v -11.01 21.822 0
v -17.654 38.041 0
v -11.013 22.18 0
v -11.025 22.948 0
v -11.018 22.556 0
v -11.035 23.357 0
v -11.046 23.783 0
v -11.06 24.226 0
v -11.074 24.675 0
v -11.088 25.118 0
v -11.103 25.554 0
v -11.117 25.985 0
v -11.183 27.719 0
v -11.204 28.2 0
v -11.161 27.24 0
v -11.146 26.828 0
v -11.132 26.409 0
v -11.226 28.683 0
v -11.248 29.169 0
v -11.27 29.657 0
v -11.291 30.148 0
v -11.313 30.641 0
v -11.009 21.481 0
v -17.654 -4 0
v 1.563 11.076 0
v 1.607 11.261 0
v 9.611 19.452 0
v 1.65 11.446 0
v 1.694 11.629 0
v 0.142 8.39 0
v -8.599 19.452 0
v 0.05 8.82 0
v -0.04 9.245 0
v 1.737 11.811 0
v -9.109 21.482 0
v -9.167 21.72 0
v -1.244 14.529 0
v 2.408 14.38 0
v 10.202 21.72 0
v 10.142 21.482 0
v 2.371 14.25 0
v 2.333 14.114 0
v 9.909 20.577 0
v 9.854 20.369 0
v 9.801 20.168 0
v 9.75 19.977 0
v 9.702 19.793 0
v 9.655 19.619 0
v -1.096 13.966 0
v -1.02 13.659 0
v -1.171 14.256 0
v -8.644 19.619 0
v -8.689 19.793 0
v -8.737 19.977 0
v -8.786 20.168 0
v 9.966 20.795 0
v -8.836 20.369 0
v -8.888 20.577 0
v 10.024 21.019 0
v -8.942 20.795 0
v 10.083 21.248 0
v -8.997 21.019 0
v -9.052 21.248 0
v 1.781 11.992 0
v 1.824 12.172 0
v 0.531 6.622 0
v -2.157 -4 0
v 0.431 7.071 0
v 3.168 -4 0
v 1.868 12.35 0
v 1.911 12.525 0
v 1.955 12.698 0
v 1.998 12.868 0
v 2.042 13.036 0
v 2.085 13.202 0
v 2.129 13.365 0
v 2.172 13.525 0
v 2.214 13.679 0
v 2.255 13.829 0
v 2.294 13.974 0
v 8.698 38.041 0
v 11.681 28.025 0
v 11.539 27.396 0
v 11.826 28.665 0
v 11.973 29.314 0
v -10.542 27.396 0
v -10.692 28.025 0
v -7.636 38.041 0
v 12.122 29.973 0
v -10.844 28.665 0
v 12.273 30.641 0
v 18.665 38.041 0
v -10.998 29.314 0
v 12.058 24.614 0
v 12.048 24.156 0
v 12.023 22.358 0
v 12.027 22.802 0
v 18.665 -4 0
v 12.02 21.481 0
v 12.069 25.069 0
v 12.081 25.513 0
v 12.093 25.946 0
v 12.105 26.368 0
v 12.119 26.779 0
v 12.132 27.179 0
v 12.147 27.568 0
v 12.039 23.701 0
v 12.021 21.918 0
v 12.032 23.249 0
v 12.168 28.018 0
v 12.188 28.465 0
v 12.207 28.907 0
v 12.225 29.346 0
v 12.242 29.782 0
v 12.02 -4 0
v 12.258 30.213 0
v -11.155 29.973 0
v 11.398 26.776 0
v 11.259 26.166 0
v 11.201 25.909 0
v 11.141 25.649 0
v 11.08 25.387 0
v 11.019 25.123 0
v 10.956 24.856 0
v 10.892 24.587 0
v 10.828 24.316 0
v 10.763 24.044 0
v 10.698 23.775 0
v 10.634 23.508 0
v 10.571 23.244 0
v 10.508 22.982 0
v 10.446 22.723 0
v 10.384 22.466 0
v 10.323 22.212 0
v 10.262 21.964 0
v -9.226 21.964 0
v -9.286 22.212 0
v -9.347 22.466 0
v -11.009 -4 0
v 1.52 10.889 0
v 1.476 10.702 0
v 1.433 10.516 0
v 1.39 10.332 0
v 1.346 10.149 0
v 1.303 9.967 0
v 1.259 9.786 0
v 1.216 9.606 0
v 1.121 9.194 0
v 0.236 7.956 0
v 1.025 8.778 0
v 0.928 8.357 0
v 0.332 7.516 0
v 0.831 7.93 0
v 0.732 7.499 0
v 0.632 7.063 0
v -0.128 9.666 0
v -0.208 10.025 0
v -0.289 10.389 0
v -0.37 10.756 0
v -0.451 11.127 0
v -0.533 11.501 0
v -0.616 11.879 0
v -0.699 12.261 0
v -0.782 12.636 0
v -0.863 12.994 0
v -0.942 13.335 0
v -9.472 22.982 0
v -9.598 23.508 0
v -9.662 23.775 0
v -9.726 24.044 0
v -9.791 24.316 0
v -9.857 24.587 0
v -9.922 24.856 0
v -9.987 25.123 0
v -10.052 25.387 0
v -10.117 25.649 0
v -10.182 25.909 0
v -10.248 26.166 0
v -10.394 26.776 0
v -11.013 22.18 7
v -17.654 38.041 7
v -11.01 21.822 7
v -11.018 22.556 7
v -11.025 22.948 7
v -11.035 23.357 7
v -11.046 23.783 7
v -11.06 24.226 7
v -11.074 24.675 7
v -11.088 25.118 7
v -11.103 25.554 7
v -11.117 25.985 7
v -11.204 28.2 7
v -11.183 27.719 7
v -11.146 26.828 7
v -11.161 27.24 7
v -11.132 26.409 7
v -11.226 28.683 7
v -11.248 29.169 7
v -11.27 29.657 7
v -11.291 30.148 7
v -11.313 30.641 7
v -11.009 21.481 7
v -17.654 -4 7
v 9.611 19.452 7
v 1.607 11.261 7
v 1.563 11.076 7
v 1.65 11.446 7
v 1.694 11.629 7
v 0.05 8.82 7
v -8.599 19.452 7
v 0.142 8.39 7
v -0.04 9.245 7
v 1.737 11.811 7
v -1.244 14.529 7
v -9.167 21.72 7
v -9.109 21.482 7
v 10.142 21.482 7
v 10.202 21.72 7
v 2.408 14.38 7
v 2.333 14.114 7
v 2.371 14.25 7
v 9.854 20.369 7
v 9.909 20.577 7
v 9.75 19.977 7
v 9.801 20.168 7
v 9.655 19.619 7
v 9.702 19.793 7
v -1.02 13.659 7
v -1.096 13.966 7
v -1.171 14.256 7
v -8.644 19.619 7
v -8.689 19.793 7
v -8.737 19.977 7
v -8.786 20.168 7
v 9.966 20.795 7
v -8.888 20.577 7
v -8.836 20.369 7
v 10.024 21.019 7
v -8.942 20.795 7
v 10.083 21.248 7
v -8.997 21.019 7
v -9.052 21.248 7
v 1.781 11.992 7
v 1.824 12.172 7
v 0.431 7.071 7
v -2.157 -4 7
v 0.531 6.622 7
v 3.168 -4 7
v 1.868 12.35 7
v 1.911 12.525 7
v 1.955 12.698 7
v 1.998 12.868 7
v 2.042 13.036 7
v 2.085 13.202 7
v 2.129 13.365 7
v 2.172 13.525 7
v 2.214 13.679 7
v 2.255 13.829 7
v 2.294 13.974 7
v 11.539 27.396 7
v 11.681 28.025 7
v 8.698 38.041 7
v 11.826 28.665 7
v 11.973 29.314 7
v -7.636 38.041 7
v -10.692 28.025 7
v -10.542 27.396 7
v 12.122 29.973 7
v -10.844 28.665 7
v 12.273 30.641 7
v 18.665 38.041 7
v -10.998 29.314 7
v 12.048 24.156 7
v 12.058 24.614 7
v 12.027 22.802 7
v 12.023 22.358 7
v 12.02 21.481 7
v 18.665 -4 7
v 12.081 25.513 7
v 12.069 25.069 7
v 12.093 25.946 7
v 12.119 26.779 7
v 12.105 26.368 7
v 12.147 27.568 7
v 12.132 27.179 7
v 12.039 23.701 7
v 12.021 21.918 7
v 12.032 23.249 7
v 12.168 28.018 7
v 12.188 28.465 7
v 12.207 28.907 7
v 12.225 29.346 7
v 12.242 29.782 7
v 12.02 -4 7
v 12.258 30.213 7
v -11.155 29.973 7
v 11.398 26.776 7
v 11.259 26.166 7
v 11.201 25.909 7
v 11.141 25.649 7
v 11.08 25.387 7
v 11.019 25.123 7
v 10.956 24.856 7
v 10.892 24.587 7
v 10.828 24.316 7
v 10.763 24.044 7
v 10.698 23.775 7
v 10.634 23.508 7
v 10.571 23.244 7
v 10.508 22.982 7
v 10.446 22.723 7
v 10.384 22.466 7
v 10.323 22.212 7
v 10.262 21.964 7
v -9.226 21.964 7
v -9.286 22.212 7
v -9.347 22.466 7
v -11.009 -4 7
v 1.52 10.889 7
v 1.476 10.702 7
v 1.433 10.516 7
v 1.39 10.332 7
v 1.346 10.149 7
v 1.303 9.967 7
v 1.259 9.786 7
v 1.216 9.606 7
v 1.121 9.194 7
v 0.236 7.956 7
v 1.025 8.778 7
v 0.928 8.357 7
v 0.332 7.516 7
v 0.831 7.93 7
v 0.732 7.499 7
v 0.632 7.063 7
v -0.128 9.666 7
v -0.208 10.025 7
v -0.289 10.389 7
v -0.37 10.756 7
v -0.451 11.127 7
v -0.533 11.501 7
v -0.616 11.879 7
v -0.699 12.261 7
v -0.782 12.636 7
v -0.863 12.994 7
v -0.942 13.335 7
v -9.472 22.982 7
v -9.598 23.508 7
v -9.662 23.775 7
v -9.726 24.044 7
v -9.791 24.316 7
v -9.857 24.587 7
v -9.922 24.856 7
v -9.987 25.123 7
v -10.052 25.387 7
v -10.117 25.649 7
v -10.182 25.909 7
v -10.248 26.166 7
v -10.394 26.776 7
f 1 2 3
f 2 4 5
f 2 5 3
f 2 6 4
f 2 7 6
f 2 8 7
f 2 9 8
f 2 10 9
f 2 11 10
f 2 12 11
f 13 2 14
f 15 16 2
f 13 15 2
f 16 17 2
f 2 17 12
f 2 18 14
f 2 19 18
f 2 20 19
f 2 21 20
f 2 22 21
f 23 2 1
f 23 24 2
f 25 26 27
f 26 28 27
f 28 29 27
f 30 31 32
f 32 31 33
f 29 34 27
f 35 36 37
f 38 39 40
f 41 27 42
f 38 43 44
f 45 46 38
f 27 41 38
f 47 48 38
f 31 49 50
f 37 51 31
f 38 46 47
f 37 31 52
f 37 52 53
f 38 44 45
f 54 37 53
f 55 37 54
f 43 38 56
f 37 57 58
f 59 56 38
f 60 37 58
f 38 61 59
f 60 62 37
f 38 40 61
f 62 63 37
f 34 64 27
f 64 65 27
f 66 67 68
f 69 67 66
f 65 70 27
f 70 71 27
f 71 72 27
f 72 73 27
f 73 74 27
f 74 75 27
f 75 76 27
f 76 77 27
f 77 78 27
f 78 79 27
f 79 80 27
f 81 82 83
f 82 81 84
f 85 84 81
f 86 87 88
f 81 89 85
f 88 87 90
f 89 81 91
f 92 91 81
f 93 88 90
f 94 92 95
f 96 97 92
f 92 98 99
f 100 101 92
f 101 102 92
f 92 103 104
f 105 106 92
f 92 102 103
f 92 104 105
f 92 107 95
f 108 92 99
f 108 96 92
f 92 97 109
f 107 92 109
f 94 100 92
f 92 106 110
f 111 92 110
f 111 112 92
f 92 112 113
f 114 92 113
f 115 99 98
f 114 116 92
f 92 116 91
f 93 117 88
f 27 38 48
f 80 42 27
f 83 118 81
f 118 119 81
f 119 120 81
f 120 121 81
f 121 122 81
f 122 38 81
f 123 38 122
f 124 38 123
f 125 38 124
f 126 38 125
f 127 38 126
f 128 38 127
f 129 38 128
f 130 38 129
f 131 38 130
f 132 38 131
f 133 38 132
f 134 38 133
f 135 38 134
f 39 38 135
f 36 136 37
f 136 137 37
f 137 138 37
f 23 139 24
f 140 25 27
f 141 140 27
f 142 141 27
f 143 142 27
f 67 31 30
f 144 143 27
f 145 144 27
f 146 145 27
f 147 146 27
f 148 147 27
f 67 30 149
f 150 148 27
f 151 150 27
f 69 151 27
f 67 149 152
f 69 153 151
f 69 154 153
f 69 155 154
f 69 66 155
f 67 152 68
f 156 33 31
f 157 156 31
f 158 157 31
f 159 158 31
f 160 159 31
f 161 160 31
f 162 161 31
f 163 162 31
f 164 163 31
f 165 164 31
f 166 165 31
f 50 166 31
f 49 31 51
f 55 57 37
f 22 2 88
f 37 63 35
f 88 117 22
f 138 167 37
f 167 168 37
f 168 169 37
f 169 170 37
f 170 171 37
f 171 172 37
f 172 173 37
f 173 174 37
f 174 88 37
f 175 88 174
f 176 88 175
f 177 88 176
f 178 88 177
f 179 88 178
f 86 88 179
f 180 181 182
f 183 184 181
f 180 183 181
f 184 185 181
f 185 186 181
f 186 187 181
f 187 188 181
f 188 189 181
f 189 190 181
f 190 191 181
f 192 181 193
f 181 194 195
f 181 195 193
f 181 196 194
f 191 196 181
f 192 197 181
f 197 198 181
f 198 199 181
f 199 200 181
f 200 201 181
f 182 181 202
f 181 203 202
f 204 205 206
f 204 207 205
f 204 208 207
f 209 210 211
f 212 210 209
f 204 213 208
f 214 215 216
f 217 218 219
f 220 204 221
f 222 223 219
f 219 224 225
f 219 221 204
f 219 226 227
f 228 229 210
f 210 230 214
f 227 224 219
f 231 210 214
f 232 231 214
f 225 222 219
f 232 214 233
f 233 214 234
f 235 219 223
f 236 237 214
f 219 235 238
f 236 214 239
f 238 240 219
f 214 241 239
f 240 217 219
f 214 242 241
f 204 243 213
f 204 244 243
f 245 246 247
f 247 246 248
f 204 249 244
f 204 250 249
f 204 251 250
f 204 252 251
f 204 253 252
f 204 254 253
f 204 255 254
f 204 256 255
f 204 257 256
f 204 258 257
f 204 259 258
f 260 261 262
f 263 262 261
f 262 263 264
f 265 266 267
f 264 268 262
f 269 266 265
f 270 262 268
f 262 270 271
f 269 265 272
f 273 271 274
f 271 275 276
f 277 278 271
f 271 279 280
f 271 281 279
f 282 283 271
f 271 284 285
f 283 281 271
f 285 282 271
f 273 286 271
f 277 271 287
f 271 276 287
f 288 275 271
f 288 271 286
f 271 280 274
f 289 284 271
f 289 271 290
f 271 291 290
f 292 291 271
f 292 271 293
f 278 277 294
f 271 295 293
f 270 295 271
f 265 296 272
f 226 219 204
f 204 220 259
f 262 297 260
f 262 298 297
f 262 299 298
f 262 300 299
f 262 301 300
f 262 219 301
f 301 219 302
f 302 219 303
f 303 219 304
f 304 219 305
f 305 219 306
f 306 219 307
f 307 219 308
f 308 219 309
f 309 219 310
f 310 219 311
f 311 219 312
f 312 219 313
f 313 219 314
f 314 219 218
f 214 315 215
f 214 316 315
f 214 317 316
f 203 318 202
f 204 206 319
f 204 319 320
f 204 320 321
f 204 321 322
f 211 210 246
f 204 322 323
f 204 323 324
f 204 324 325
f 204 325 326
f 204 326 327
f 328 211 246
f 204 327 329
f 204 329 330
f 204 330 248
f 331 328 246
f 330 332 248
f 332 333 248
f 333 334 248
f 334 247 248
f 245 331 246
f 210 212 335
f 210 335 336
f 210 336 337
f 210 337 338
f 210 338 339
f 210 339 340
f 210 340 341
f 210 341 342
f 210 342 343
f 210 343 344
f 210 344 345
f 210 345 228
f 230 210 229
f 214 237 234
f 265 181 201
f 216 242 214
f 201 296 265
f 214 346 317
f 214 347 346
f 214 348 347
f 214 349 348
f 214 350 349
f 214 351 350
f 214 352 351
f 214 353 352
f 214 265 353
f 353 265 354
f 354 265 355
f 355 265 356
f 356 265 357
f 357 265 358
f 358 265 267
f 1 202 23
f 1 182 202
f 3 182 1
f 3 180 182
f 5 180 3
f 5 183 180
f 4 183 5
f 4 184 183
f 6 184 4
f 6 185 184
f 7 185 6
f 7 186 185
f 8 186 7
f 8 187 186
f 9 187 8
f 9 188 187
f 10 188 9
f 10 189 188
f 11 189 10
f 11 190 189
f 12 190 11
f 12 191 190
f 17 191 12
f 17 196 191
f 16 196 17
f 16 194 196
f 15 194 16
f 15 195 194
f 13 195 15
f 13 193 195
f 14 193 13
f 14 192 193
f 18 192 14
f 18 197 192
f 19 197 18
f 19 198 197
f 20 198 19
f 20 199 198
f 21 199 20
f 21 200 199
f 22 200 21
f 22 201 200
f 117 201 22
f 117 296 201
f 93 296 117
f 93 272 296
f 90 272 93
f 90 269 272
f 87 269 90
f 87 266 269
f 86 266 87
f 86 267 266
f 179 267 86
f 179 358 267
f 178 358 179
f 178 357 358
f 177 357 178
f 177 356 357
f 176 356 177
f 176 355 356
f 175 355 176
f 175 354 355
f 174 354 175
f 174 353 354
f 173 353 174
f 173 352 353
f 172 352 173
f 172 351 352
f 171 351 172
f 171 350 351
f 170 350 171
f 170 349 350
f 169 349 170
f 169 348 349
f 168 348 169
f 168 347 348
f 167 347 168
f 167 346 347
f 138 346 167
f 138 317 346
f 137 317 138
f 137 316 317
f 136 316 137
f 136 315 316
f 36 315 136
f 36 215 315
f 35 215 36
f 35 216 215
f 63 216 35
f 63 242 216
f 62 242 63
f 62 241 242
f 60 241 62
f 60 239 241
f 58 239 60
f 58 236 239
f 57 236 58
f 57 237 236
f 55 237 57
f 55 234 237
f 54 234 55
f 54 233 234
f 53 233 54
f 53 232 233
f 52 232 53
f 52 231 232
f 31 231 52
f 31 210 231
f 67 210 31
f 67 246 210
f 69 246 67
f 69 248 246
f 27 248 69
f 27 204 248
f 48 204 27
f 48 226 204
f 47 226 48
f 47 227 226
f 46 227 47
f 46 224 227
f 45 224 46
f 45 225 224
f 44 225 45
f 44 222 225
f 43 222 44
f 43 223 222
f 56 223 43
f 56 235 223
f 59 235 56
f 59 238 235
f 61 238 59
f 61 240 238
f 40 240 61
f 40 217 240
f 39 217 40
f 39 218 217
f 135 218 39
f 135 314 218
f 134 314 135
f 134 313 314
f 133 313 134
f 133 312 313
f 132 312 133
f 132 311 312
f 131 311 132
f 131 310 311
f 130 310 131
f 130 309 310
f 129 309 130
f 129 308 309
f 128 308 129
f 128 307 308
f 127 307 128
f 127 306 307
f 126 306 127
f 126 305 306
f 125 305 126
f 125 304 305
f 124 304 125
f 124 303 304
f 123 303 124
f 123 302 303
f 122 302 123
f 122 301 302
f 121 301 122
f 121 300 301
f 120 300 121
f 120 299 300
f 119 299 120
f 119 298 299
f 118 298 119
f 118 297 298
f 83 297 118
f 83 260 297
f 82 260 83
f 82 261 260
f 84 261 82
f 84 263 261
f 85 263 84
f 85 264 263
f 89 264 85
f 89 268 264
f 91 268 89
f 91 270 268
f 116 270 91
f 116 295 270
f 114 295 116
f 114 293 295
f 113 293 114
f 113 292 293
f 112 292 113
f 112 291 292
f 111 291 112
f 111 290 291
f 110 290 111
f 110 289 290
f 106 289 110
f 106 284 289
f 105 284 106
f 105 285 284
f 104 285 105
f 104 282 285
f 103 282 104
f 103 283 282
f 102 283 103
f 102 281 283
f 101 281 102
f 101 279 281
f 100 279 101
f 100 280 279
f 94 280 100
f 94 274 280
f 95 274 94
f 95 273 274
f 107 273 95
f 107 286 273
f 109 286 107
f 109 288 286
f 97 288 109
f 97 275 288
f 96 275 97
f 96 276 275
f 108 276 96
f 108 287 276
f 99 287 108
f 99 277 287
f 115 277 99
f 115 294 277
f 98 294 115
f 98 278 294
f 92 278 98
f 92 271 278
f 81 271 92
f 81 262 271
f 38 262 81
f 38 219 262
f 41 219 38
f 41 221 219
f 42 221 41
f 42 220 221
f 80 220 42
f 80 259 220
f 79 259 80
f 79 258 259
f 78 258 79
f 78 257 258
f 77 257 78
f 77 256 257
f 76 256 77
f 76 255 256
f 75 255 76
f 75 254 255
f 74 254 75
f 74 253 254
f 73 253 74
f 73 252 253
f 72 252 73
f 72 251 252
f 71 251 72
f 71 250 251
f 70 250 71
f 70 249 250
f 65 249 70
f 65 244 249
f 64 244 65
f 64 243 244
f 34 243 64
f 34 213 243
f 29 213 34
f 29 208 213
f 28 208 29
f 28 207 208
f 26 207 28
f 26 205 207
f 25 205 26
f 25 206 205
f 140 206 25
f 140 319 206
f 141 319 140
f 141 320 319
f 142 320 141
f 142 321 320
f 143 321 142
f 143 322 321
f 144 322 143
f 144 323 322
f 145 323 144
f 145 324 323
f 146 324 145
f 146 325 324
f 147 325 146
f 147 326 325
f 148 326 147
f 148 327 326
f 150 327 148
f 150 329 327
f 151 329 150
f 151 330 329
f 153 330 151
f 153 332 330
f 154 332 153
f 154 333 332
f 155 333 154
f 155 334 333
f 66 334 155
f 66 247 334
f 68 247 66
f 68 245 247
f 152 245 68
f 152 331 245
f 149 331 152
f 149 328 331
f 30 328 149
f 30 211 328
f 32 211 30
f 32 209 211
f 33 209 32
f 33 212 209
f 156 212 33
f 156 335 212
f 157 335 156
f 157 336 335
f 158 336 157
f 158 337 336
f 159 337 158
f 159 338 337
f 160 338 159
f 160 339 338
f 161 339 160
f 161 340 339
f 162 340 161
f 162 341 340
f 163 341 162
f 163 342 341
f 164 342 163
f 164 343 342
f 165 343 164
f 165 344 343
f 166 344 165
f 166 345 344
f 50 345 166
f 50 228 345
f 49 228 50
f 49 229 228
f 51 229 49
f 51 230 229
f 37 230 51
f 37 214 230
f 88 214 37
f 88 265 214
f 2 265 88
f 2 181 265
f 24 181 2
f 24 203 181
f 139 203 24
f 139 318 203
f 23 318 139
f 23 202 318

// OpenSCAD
// file: glyph.scad
// glyph — the shared geometry of every letter in the set. Defines named geometry
// only, so it renders nothing on its own; each letter part includes it and calls
// letter(). Every dimension lives in ../../lib/common.scad.
//
// A LETTER IS NOTHING BUT A LETTER. No plinth, no tongue, no tab — it is the
// bare glyph, and it attaches by standing in the deck groove and resting on the
// groove's floor. Anything else on it would be a distraction on a learning toy.
//
// It is a flat plate of one thickness, printed face-down: no overhang anywhere,
// no supports, and the face on the bed comes out smoothest.
//
// TWO TRAPS WITH text():
//
//  * A missing font FALLS BACK SILENTLY — no warning, no error, just different
//    letters. "Liberation Sans" was the first choice here because OpenSCAD
//    bundles it; on macOS the bundled faces are not registered with fontconfig,
//    so it rendered the fallback face instead and nothing said so. To check a
//    font resolved, render a string with it and with a deliberately bogus name
//    and compare bounding boxes: identical means it fell back.
//  * `size` is not the cap height in general. For Helvetica Bold they coincide
//    (size 44 -> 44.0 mm cap), which is why letter_size reads as a height.
//    Change the font and re-measure.

include <../../lib/common.scad>

// The letter's outline, upright in the XY plane, ready to be extruded along Z
// (which is the letter's thickness, and the print's build axis).
//
//   y = 0   is the deck surface
//   y < 0   is the part standing down inside the groove. It reaches letter_bury,
//           which is where the tapered groove closes to letter_t — NOT the
//           groove's floor. The letter wedges; it never bottoms out.
module glyph_2d(ch) {
    intersection() {
        translate([0, -letter_bury])
            scale([letter_condense, 1])
                text(ch, size = letter_size, font = letter_font,
                     halign = "center", valign = "baseline");
        // Trimmed flat at the baseline. Round letters (O, C, G, S) overshoot the
        // baseline by design, and a letter standing on a convex curve rocks —
        // there is nothing to stop it leaning. The trim costs nothing visible
        // and gives every letter a flat foot on the groove floor.
        translate([-200, -letter_bury]) square([400, 400]);
    }
}

// One letter, in its print orientation: lying on its face, thickness up Z.
module letter(ch) {
    linear_extrude(letter_t) glyph_2d(ch);
}

// Where that letter sits once it is dropped into a chassis, for fit checks.
module letter_fitted(ch) {
    translate([0, letter_t/2, body_top]) rotate([90, 0, 0]) letter(ch);
}
// main file
// letter M — one part. See glyph.scad for the geometry and lib/common.scad for
// the dimensions. Prints lying on its face, exactly as exported: no supports.

include <glyph.scad>

letter("M");
